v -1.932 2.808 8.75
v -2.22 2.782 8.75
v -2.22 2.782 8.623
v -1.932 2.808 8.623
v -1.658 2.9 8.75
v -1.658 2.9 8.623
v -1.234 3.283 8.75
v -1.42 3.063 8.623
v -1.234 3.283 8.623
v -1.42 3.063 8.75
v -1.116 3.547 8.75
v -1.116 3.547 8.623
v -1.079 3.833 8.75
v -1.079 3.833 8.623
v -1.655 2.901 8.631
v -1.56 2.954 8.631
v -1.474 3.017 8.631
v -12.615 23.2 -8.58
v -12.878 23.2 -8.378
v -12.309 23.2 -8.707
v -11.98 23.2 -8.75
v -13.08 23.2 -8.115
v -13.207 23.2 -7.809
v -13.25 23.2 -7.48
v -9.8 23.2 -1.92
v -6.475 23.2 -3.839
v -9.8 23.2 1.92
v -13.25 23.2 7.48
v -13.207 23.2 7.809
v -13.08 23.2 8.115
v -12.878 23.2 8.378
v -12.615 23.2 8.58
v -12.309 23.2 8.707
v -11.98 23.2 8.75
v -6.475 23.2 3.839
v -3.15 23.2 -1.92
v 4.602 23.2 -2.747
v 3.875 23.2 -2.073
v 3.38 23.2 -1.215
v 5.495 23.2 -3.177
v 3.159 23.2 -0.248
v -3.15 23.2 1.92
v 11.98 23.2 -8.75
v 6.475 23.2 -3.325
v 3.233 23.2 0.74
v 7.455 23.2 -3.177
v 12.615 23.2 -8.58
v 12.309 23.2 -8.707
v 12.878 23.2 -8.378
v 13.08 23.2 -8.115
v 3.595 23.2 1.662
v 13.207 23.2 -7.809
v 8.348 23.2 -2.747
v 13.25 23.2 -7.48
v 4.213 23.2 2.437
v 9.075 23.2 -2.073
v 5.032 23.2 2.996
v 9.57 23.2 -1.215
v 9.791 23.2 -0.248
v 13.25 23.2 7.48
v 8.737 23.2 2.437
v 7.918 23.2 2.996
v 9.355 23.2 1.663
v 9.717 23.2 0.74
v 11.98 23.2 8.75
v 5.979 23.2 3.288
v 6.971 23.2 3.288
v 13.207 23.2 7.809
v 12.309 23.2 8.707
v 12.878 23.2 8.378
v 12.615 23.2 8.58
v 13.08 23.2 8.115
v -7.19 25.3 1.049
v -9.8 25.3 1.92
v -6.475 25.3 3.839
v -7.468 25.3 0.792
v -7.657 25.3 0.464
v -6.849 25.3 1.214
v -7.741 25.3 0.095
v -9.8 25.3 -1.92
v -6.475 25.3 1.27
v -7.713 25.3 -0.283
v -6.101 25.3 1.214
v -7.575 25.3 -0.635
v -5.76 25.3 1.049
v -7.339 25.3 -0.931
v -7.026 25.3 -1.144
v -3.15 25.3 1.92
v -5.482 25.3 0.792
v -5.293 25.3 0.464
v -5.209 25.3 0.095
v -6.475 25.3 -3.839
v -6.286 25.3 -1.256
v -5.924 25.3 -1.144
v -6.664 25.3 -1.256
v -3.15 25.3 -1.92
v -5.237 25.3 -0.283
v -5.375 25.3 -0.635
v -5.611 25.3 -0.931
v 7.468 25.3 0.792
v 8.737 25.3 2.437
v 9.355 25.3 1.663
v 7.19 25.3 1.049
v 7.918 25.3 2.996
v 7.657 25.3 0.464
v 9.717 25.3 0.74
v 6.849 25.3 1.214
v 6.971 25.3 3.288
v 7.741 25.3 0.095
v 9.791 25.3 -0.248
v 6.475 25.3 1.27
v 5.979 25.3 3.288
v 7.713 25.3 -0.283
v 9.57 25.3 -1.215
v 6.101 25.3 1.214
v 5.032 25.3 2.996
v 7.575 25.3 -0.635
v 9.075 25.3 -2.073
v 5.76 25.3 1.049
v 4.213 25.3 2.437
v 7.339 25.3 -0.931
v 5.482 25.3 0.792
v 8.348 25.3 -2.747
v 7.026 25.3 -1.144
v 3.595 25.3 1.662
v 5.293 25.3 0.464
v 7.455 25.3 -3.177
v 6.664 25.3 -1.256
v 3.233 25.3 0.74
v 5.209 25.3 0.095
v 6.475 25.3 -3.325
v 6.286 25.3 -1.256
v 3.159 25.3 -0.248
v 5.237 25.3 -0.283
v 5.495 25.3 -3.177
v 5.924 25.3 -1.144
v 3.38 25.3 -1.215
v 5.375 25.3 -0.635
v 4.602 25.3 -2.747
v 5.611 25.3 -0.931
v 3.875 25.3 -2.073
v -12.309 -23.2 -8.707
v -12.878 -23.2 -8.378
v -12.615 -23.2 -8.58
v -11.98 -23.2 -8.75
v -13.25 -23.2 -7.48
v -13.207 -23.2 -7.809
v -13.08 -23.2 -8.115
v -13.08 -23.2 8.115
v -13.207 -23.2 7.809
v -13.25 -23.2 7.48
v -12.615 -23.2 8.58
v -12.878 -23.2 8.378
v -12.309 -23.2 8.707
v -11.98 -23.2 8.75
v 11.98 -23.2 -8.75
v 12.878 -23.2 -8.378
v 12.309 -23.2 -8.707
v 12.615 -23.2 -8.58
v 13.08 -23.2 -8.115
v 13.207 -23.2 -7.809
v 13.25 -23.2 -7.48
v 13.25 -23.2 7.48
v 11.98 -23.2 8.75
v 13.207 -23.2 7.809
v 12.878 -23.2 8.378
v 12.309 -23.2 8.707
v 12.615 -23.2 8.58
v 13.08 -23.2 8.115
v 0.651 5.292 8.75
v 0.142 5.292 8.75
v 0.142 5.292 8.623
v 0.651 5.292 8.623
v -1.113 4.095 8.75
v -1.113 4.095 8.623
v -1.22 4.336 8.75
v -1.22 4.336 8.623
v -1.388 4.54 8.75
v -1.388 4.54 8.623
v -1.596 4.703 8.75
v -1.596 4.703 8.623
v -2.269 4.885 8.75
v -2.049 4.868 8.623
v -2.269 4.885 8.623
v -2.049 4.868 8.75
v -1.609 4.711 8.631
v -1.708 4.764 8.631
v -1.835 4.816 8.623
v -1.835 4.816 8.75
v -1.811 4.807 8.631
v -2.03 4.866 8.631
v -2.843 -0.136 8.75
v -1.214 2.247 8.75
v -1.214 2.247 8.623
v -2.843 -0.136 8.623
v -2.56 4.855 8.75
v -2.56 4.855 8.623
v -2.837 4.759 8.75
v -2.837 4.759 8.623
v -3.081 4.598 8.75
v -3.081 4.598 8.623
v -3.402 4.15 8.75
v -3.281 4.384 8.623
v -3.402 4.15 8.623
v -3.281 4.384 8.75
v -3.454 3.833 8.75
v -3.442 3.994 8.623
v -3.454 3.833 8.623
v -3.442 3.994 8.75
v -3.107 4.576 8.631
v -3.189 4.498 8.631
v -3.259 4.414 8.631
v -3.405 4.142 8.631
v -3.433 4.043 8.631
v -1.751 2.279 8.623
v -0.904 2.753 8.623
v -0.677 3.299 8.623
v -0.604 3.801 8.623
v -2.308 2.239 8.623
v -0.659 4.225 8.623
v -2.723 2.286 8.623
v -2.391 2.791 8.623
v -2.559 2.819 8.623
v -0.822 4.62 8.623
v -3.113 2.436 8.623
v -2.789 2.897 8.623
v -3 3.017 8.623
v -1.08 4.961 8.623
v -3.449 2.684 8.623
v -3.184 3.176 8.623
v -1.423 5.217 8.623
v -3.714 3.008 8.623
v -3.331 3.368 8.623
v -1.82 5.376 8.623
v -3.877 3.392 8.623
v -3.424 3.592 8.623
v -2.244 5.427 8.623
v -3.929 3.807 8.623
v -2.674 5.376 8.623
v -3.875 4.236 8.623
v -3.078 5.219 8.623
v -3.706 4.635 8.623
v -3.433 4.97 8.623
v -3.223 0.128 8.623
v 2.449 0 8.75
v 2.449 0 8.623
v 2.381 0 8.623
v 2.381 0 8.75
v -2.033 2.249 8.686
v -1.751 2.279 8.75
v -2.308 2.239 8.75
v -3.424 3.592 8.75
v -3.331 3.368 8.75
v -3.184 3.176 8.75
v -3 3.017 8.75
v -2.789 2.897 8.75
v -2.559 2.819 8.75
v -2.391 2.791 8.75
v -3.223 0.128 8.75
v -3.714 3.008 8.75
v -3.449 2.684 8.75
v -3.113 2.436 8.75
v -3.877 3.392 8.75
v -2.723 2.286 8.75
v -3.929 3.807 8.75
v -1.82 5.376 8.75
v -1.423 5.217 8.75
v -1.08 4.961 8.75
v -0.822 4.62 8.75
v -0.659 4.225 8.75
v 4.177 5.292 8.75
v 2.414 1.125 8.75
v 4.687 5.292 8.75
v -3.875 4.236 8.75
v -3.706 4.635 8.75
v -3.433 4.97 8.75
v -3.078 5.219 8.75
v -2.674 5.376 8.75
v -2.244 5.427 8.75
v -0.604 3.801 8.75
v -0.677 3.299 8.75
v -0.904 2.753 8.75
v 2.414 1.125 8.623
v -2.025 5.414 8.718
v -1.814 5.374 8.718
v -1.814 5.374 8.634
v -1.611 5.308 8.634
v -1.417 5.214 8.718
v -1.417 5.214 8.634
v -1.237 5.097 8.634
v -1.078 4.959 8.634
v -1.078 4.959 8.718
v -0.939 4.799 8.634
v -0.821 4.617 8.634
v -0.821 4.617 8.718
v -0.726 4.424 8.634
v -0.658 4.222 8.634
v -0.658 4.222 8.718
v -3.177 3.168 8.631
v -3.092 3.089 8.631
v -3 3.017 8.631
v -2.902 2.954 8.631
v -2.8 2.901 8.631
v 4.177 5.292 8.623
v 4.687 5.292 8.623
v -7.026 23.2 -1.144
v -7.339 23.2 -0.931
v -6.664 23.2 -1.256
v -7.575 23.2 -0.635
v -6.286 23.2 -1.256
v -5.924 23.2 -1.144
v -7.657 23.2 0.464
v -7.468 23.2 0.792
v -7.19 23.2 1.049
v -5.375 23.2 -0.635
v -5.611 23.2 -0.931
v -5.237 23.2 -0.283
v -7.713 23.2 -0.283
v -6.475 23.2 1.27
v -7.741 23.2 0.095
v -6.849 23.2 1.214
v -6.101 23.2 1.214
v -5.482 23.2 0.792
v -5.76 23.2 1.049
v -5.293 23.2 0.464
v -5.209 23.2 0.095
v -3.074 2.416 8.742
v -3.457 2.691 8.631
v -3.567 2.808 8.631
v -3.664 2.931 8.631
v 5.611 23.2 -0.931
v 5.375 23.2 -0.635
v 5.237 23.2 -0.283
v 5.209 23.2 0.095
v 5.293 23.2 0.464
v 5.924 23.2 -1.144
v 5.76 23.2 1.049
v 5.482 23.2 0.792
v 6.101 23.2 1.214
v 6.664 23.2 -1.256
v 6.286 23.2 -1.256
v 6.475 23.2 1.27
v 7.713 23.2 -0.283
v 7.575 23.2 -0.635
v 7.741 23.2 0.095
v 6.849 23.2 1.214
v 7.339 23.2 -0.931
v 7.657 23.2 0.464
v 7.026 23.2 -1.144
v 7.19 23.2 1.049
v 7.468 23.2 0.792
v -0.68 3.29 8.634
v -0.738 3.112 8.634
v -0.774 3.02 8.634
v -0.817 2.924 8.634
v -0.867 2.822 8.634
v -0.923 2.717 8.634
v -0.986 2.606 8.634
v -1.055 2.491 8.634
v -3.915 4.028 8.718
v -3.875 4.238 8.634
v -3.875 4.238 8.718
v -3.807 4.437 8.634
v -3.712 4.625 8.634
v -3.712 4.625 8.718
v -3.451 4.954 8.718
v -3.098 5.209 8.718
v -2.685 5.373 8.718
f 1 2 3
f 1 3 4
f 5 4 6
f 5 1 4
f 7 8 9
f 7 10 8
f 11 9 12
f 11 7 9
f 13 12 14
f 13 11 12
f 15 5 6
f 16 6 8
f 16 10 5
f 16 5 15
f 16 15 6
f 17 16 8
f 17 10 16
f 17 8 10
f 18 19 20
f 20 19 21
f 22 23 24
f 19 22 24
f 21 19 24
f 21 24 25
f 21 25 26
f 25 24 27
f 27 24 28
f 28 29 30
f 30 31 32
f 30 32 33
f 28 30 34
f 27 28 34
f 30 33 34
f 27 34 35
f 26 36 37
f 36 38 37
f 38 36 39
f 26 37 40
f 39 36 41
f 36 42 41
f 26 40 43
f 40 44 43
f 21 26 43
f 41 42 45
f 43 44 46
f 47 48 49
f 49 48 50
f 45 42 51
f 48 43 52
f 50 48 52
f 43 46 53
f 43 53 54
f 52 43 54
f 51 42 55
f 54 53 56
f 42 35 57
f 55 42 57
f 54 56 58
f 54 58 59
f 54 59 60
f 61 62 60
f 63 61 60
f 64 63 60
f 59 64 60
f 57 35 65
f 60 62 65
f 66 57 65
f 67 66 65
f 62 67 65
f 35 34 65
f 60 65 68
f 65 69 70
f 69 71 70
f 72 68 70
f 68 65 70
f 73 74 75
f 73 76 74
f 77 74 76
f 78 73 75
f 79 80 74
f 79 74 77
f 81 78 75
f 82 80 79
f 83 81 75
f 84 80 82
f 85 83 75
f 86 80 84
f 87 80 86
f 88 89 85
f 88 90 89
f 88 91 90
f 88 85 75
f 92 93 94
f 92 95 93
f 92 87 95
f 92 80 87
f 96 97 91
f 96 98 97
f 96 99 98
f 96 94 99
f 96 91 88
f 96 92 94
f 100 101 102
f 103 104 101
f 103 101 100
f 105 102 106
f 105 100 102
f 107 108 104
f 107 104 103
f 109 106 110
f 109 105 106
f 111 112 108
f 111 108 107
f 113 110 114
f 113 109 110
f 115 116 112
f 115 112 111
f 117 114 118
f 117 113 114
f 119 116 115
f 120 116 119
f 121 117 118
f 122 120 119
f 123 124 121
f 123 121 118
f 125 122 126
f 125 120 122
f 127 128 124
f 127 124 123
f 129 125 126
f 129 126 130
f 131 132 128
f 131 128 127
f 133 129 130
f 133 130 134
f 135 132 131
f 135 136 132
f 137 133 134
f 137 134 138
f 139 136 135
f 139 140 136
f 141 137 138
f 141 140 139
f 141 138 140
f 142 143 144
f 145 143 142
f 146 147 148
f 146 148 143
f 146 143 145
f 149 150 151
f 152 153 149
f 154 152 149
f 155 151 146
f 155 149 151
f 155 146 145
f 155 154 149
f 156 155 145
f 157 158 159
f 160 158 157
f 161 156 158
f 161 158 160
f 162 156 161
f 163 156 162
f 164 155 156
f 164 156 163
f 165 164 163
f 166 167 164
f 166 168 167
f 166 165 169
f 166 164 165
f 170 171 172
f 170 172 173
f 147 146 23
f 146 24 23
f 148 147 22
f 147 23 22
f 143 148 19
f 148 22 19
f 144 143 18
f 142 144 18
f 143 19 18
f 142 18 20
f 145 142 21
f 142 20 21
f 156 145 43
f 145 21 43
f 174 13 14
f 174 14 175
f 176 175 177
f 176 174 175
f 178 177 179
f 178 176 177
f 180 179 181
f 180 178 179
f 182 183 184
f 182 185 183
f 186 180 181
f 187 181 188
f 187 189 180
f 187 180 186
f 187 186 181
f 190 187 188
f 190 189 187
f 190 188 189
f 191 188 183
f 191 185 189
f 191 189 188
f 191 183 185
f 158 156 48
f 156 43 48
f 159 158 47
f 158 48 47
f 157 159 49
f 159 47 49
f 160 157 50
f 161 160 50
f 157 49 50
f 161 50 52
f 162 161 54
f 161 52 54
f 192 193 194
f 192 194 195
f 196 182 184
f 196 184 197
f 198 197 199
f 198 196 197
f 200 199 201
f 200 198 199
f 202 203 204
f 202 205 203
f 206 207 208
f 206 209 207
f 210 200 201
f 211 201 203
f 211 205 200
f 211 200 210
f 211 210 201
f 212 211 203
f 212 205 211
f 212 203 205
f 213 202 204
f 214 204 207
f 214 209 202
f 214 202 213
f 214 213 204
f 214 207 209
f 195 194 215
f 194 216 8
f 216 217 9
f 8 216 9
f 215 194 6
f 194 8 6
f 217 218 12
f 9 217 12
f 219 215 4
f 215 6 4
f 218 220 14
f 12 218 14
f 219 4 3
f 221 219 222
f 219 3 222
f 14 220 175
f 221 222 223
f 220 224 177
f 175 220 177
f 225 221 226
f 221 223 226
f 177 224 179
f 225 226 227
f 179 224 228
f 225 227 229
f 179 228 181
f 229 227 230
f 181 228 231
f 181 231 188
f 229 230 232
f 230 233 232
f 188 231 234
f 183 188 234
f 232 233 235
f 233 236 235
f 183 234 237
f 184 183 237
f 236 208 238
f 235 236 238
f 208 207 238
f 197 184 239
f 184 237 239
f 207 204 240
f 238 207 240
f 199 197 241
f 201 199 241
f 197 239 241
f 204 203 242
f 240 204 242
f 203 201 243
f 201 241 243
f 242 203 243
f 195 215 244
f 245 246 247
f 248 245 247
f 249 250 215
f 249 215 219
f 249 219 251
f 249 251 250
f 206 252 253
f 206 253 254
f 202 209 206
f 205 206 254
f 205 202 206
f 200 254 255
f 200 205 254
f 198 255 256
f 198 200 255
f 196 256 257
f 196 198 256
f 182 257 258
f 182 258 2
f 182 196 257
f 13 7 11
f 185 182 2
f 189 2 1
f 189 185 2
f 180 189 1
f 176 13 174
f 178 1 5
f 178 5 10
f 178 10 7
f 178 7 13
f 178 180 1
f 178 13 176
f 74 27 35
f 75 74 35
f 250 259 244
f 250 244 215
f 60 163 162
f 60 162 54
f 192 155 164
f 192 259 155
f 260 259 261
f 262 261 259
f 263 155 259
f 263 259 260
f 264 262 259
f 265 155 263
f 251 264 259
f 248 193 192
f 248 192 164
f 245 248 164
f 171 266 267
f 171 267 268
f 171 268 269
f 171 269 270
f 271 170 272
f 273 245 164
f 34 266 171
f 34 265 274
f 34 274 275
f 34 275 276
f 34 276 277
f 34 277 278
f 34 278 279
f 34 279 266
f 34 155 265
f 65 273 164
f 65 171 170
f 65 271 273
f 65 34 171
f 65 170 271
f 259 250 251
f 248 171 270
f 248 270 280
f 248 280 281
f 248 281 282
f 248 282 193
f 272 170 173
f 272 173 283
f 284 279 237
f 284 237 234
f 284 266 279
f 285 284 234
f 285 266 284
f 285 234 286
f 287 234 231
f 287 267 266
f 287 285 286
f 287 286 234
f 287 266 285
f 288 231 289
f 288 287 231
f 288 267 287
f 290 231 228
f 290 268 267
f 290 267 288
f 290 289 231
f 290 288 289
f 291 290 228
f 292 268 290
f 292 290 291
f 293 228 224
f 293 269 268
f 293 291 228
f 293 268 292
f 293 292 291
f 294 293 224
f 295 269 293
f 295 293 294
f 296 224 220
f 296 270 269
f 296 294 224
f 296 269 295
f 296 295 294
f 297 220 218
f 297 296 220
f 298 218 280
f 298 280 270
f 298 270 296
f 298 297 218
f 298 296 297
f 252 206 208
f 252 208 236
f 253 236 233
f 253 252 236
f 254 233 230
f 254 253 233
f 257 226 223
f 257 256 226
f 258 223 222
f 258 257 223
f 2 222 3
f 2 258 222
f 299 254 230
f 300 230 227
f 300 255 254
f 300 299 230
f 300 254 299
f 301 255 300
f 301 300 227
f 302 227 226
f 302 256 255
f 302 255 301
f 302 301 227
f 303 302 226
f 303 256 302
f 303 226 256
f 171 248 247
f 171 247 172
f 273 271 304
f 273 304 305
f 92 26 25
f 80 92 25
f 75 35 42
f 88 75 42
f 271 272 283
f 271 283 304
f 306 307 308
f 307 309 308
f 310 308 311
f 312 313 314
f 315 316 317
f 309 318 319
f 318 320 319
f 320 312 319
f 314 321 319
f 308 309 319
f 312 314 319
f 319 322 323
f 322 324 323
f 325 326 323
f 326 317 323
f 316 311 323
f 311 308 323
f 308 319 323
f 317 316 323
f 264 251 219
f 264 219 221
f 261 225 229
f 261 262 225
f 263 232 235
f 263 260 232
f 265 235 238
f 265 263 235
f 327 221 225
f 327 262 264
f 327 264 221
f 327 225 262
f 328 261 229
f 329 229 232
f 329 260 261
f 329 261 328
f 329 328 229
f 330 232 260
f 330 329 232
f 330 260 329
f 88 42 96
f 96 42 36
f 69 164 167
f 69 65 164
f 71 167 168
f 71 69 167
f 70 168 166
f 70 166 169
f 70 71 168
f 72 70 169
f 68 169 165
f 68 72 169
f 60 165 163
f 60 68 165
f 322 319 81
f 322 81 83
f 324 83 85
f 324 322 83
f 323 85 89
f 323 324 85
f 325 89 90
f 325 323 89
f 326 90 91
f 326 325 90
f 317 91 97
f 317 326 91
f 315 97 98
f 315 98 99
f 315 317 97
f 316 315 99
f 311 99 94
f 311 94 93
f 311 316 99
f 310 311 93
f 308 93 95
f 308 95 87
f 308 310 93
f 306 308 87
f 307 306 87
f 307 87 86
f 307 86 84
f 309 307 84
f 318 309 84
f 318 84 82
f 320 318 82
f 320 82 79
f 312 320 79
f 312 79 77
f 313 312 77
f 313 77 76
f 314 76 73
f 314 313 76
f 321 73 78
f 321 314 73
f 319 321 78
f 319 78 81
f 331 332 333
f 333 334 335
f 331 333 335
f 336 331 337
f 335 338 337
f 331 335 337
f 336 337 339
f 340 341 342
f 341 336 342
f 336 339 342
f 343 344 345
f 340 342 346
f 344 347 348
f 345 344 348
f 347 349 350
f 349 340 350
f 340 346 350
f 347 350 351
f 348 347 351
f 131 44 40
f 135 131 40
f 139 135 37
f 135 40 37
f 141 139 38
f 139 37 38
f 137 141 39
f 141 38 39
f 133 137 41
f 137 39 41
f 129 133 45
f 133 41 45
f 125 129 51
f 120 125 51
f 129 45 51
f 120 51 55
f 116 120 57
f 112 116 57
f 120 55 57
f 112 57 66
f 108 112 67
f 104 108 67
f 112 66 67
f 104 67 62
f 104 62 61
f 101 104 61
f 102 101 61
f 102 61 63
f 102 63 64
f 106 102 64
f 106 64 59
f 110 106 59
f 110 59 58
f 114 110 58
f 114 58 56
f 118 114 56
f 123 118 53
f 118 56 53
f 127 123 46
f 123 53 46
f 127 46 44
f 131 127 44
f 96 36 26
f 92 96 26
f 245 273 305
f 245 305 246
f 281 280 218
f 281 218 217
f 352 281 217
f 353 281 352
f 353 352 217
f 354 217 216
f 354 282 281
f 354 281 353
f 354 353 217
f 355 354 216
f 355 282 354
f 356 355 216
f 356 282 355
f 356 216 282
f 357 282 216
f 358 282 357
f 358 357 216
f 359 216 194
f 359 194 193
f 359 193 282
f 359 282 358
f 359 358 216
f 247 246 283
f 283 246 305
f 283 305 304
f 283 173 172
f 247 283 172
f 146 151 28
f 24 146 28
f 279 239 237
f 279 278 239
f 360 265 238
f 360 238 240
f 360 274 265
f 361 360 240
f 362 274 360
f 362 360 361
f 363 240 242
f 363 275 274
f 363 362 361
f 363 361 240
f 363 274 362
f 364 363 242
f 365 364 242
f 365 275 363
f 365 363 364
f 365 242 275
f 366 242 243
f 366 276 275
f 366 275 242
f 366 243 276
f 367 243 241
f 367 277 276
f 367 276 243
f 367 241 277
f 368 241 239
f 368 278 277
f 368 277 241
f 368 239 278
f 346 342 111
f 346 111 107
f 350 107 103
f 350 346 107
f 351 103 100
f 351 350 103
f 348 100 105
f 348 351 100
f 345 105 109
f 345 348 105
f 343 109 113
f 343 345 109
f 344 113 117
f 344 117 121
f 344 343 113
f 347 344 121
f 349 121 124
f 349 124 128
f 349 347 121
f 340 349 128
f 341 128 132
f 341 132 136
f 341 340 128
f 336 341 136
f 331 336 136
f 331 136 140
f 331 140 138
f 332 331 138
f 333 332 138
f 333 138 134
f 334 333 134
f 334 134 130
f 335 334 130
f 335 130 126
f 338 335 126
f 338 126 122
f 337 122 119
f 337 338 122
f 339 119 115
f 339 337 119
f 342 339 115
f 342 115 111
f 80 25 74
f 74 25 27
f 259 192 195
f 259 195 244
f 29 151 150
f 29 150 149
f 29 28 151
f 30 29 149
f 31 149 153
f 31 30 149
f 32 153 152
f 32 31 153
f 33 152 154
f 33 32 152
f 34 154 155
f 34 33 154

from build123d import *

# Parameters (mm, degrees)
SKETCH1_W           = 26.5
SKETCH1_H           = 46.4
BOSS_EXTRUDE1_DEPTH = 8.75
SKETCH2_R           = 3.325
SKETCH2_R_2         = 1.27
BOSS_EXTRUDE2_DEPTH = 2.1
CUT_EXTRUDE1_DEPTH  = 0.127
FILLET1_R           = 1.27


with BuildPart() as part:
    # Sketch1 → Boss-Extrude1 (new, symmetric)
    with BuildSketch(Plane.XY):
        Rectangle(SKETCH1_W, SKETCH1_H)
    extrude(amount=BOSS_EXTRUDE1_DEPTH, both=True)

    # Sketch2 → Boss-Extrude2 (add)
    # profile 1 of 2: a face of its own
    with BuildSketch(Plane(origin=(0, 23.2, 0), x_dir=(1, 0, 0), z_dir=(0, 1, 0))):
        with Locations(Location((6.475, 0, 0), (0, 0, 90))):
            Circle(SKETCH2_R)
        with Locations(Location((6.475, 0, 0), (0, 0, 270))):
            Circle(SKETCH2_R_2, mode=Mode.SUBTRACT)
    # profile 2 of 2: a face of its own
    with BuildSketch(Plane(origin=(0, 23.2, 0), x_dir=(1, 0, 0), z_dir=(0, 1, 0))):
        Polygon((-6.475, 3.83937929), (-9.8, 1.919689645), (-9.8, -1.919689645), (-6.475, -3.83937929), (-3.15, -1.919689645), (-3.15, 1.919689645), align=None)
        with Locations(Location((-6.475, 0, 0), (0, 0, 270))):
            Circle(SKETCH2_R_2, mode=Mode.SUBTRACT)
    extrude(amount=BOSS_EXTRUDE2_DEPTH)

    # Sketch3 → Cut-Extrude1 (cut)
    # profile 1 of 2: a face of its own
    with BuildSketch(Plane.XY.offset(8.75)):
        with BuildLine():
            Line((-2.843132665, -0.135683761), (-3.222623183, 0.128263555))
            Line((-3.222623183, 0.128263555), (-1.751302403, 2.279063168))
            add(Edge.make_bspline(
                [(-1.751302403, 2.279063168), (-1.845177682, 2.267583179), (-2.03002334, 2.244978442), (-2.216194911, 2.240825761), (-2.307817828, 2.238782051)],
                knots=[0, 0, 0, 0, 1.015715272, 2, 2, 2, 2], degree=3))
            add(Edge.make_bspline(
                [(-2.307817828, 2.238782051), (-2.363368305, 2.240204869), (-2.472409033, 2.242997737), (-2.632718794, 2.265134756), (-2.786760058, 2.299228402), (-2.934124441, 2.350102115), (-3.075365836, 2.413327264), (-3.210175902, 2.49173013), (-3.338373165, 2.583965833), (-3.458580797, 2.689546665), (-3.567909259, 2.805476578), (-3.66531115, 2.928176181), (-3.746260242, 3.059070803), (-3.813504604, 3.195490302), (-3.864501837, 3.339395439), (-3.901638055, 3.489148699), (-3.924501614, 3.645799634), (-3.927221675, 3.752426915), (-3.92860275, 3.806565505)],
                knots=[0, 0, 0, 0, 1.060718605, 2.082097864, 3.085795603, 4.069760067, 5.054557537, 6.03741023, 7.043284206, 8.066802108, 9.088538119, 10.083643548, 11.053783639, 12.022749082, 12.983451788, 13.964007469, 14.966251758, 16, 16, 16, 16], degree=3))
            add(Edge.make_bspline(
                [(-3.92860275, 3.806565505), (-3.92598045, 3.880601444), (-3.920833407, 4.025918974), (-3.879409458, 4.238241458), (-3.811282517, 4.439002066), (-3.716291995, 4.627672954), (-3.596647832, 4.801540095), (-3.452852702, 4.958186445), (-3.285781232, 5.095384022), (-3.09923937, 5.213318758), (-2.897622303, 5.308168099), (-2.686456594, 5.378077517), (-2.467360245, 5.419199434), (-2.318940077, 5.424620914), (-2.244216065, 5.427350427)],
                knots=[0, 0, 0, 0, 1.022988612, 2.007919123, 2.978103895, 3.94594894, 4.918897164, 5.887013414, 6.875921846, 7.89917871, 8.930658928, 9.948724884, 10.967259574, 12, 12, 12, 12], degree=3))
            add(Edge.make_bspline(
                [(-2.244216065, 5.427350427), (-2.170906192, 5.424583395), (-2.026052794, 5.419116), (-1.813042034, 5.379074761), (-1.609024068, 5.311588363), (-1.415129862, 5.218327177), (-1.235607179, 5.101425329), (-1.074172322, 4.962126704), (-0.934509305, 4.800344538), (-0.816847009, 4.619991701), (-0.722398257, 4.426215432), (-0.654253258, 4.223946883), (-0.612304494, 4.014640721), (-0.607018381, 3.872832409), (-0.604350614, 3.801265358)],
                knots=[0, 0, 0, 0, 1.026385292, 2.028040595, 3.023318987, 4.028184125, 5.03290303, 6.015178782, 7.004435299, 8.016004309, 9.023023918, 10.015172535, 10.998308025, 12, 12, 12, 12], degree=3))
            add(Edge.make_bspline(
                [(-0.604350614, 3.801265358), (-0.606132256, 3.745712281), (-0.609745871, 3.633036762), (-0.635049573, 3.461843267), (-0.678018187, 3.287292003), (-0.726779683, 3.139546257), (-0.773848556, 3.017522768), (-0.818149077, 2.921136451), (-0.867304356, 2.819685731), (-0.924633918, 2.714234399), (-0.986262629, 2.603438185), (-1.055899868, 2.488408365), (-1.131957102, 2.368990578), (-1.186128226, 2.288486052), (-1.213867507, 2.247262286)],
                knots=[0, 0, 0, 0, 1.179839688, 2.393009684, 3.667231171, 4.993948276, 5.694988576, 6.444077775, 7.246288328, 8.089075292, 8.993003841, 9.939041771, 10.944649915, 12, 12, 12, 12], degree=3))
            Line((-1.213867507, 2.247262286), (-2.843132665, -0.135683761))
        make_face()
        with BuildLine():
            add(Edge.make_bspline(
                [(-2.219835389, 2.781517094), (-2.177753011, 2.782666722), (-2.095832926, 2.784904656), (-1.97582201, 2.798525772), (-1.86254375, 2.822676918), (-1.755695551, 2.85732934), (-1.654206069, 2.899143589), (-1.559687334, 2.952380758), (-1.472060244, 3.015905909), (-1.390738021, 3.087282956), (-1.318523403, 3.166583243), (-1.254202392, 3.24958244), (-1.199531058, 3.336644886), (-1.156346103, 3.42886089), (-1.120839662, 3.523985717), (-1.096319572, 3.62355123), (-1.082736116, 3.727038693), (-1.080420521, 3.797340236), (-1.079243776, 3.833066239)],
                knots=[0, 0, 0, 0, 1.163407946, 2.26475976, 3.333800367, 4.359385343, 5.366239384, 6.363380779, 7.350133999, 8.353570782, 9.349036268, 10.310270964, 11.253520213, 12.184142, 13.120487599, 14.056272588, 15.012232024, 16, 16, 16, 16], degree=3))
            add(Edge.make_bspline(
                [(-1.079243776, 3.833066239), (-1.080256252, 3.868807162), (-1.08225146, 3.939239033), (-1.098258449, 4.042879712), (-1.126418012, 4.142201665), (-1.164201245, 4.237748649), (-1.21397351, 4.32873564), (-1.273699018, 4.41630497), (-1.344656412, 4.499901401), (-1.426303149, 4.577558852), (-1.514348247, 4.649144366), (-1.608177813, 4.712320934), (-1.70701846, 4.765269647), (-1.810267177, 4.808962137), (-1.918139085, 4.843058274), (-2.030570353, 4.867577385), (-2.148129121, 4.881141824), (-2.227929399, 4.883442783), (-2.268596741, 4.884615385)],
                knots=[0, 0, 0, 0, 0.972161553, 1.915763587, 2.844109794, 3.775983486, 4.705125789, 5.659731448, 6.655561913, 7.682237399, 8.721216875, 9.739758359, 10.754845918, 11.767244016, 12.7857855, 13.828538656, 14.893392813, 16, 16, 16, 16], degree=3))
            add(Edge.make_bspline(
                [(-2.268596741, 4.884615385), (-2.308910401, 4.883440889), (-2.388005471, 4.881136539), (-2.50451914, 4.867603169), (-2.616190192, 4.842893377), (-2.723749546, 4.808977931), (-2.826995195, 4.765266388), (-2.92583118, 4.712318159), (-3.019682694, 4.649158909), (-3.107643379, 4.577502527), (-3.189434285, 4.500262871), (-3.259171692, 4.415938759), (-3.319033886, 4.328781192), (-3.368737759, 4.237736543), (-3.406539184, 4.142204896), (-3.434693877, 4.042878836), (-3.450702174, 3.939239261), (-3.452697203, 3.868807239), (-3.453709588, 3.833066239)],
                knots=[0, 0, 0, 0, 1.099389452, 2.15699305, 3.192601482, 4.213358962, 5.227959689, 6.245255729, 7.266013209, 8.307253147, 9.336162325, 10.327954924, 11.284637477, 12.215801273, 13.149702402, 14.080068371, 15.025723358, 16, 16, 16, 16], degree=3))
            add(Edge.make_bspline(
                [(-3.453709588, 3.833066239), (-3.452793485, 3.797312415), (-3.450986763, 3.72679933), (-3.433557843, 3.62319395), (-3.40441092, 3.523879657), (-3.365374461, 3.427890778), (-3.313967294, 3.336160707), (-3.25088481, 3.249124338), (-3.176944282, 3.165795027), (-3.093134128, 3.087467456), (-3.001409647, 3.015573096), (-2.903443138, 2.952783113), (-2.800921122, 2.899756918), (-2.693482704, 2.857209825), (-2.58192409, 2.823023144), (-2.465242642, 2.798570284), (-2.343824235, 2.785035309), (-2.261561524, 2.782701084), (-2.219835389, 2.781517094)],
                knots=[0, 0, 0, 0, 0.952633368, 1.87876736, 2.791047057, 3.707742249, 4.635551637, 5.587206343, 6.568248508, 7.601284464, 8.641511608, 9.671105535, 10.699146789, 11.713763218, 12.747829548, 13.806491675, 14.887386225, 16, 16, 16, 16], degree=3))
        make_face(mode=Mode.SUBTRACT)
    # profile 2 of 2: a face of its own
    with BuildSketch(Plane.XY.offset(8.75)):
        Polygon((0.14191007, 5.291666667), (0.650724173, 5.291666667), (2.413553032, 1.124691173), (4.177441921, 5.291666667), (4.687316053, 5.291666667), (2.448534002, 0), (2.380692122, 0), align=None)
    extrude(amount=-CUT_EXTRUDE1_DEPTH, mode=Mode.SUBTRACT)

    # Fillet1
    fillet1_edges = [part.edges().sort_by_distance(p)[0] for p in [
        (-13.25, 0, 8.75),
        (13.25, 0, 8.75),
        (-13.25, 0, -8.75),
        (13.25, 0, -8.75),
    ]]
    fillet(fillet1_edges, radius=FILLET1_R)


solid = part.part
